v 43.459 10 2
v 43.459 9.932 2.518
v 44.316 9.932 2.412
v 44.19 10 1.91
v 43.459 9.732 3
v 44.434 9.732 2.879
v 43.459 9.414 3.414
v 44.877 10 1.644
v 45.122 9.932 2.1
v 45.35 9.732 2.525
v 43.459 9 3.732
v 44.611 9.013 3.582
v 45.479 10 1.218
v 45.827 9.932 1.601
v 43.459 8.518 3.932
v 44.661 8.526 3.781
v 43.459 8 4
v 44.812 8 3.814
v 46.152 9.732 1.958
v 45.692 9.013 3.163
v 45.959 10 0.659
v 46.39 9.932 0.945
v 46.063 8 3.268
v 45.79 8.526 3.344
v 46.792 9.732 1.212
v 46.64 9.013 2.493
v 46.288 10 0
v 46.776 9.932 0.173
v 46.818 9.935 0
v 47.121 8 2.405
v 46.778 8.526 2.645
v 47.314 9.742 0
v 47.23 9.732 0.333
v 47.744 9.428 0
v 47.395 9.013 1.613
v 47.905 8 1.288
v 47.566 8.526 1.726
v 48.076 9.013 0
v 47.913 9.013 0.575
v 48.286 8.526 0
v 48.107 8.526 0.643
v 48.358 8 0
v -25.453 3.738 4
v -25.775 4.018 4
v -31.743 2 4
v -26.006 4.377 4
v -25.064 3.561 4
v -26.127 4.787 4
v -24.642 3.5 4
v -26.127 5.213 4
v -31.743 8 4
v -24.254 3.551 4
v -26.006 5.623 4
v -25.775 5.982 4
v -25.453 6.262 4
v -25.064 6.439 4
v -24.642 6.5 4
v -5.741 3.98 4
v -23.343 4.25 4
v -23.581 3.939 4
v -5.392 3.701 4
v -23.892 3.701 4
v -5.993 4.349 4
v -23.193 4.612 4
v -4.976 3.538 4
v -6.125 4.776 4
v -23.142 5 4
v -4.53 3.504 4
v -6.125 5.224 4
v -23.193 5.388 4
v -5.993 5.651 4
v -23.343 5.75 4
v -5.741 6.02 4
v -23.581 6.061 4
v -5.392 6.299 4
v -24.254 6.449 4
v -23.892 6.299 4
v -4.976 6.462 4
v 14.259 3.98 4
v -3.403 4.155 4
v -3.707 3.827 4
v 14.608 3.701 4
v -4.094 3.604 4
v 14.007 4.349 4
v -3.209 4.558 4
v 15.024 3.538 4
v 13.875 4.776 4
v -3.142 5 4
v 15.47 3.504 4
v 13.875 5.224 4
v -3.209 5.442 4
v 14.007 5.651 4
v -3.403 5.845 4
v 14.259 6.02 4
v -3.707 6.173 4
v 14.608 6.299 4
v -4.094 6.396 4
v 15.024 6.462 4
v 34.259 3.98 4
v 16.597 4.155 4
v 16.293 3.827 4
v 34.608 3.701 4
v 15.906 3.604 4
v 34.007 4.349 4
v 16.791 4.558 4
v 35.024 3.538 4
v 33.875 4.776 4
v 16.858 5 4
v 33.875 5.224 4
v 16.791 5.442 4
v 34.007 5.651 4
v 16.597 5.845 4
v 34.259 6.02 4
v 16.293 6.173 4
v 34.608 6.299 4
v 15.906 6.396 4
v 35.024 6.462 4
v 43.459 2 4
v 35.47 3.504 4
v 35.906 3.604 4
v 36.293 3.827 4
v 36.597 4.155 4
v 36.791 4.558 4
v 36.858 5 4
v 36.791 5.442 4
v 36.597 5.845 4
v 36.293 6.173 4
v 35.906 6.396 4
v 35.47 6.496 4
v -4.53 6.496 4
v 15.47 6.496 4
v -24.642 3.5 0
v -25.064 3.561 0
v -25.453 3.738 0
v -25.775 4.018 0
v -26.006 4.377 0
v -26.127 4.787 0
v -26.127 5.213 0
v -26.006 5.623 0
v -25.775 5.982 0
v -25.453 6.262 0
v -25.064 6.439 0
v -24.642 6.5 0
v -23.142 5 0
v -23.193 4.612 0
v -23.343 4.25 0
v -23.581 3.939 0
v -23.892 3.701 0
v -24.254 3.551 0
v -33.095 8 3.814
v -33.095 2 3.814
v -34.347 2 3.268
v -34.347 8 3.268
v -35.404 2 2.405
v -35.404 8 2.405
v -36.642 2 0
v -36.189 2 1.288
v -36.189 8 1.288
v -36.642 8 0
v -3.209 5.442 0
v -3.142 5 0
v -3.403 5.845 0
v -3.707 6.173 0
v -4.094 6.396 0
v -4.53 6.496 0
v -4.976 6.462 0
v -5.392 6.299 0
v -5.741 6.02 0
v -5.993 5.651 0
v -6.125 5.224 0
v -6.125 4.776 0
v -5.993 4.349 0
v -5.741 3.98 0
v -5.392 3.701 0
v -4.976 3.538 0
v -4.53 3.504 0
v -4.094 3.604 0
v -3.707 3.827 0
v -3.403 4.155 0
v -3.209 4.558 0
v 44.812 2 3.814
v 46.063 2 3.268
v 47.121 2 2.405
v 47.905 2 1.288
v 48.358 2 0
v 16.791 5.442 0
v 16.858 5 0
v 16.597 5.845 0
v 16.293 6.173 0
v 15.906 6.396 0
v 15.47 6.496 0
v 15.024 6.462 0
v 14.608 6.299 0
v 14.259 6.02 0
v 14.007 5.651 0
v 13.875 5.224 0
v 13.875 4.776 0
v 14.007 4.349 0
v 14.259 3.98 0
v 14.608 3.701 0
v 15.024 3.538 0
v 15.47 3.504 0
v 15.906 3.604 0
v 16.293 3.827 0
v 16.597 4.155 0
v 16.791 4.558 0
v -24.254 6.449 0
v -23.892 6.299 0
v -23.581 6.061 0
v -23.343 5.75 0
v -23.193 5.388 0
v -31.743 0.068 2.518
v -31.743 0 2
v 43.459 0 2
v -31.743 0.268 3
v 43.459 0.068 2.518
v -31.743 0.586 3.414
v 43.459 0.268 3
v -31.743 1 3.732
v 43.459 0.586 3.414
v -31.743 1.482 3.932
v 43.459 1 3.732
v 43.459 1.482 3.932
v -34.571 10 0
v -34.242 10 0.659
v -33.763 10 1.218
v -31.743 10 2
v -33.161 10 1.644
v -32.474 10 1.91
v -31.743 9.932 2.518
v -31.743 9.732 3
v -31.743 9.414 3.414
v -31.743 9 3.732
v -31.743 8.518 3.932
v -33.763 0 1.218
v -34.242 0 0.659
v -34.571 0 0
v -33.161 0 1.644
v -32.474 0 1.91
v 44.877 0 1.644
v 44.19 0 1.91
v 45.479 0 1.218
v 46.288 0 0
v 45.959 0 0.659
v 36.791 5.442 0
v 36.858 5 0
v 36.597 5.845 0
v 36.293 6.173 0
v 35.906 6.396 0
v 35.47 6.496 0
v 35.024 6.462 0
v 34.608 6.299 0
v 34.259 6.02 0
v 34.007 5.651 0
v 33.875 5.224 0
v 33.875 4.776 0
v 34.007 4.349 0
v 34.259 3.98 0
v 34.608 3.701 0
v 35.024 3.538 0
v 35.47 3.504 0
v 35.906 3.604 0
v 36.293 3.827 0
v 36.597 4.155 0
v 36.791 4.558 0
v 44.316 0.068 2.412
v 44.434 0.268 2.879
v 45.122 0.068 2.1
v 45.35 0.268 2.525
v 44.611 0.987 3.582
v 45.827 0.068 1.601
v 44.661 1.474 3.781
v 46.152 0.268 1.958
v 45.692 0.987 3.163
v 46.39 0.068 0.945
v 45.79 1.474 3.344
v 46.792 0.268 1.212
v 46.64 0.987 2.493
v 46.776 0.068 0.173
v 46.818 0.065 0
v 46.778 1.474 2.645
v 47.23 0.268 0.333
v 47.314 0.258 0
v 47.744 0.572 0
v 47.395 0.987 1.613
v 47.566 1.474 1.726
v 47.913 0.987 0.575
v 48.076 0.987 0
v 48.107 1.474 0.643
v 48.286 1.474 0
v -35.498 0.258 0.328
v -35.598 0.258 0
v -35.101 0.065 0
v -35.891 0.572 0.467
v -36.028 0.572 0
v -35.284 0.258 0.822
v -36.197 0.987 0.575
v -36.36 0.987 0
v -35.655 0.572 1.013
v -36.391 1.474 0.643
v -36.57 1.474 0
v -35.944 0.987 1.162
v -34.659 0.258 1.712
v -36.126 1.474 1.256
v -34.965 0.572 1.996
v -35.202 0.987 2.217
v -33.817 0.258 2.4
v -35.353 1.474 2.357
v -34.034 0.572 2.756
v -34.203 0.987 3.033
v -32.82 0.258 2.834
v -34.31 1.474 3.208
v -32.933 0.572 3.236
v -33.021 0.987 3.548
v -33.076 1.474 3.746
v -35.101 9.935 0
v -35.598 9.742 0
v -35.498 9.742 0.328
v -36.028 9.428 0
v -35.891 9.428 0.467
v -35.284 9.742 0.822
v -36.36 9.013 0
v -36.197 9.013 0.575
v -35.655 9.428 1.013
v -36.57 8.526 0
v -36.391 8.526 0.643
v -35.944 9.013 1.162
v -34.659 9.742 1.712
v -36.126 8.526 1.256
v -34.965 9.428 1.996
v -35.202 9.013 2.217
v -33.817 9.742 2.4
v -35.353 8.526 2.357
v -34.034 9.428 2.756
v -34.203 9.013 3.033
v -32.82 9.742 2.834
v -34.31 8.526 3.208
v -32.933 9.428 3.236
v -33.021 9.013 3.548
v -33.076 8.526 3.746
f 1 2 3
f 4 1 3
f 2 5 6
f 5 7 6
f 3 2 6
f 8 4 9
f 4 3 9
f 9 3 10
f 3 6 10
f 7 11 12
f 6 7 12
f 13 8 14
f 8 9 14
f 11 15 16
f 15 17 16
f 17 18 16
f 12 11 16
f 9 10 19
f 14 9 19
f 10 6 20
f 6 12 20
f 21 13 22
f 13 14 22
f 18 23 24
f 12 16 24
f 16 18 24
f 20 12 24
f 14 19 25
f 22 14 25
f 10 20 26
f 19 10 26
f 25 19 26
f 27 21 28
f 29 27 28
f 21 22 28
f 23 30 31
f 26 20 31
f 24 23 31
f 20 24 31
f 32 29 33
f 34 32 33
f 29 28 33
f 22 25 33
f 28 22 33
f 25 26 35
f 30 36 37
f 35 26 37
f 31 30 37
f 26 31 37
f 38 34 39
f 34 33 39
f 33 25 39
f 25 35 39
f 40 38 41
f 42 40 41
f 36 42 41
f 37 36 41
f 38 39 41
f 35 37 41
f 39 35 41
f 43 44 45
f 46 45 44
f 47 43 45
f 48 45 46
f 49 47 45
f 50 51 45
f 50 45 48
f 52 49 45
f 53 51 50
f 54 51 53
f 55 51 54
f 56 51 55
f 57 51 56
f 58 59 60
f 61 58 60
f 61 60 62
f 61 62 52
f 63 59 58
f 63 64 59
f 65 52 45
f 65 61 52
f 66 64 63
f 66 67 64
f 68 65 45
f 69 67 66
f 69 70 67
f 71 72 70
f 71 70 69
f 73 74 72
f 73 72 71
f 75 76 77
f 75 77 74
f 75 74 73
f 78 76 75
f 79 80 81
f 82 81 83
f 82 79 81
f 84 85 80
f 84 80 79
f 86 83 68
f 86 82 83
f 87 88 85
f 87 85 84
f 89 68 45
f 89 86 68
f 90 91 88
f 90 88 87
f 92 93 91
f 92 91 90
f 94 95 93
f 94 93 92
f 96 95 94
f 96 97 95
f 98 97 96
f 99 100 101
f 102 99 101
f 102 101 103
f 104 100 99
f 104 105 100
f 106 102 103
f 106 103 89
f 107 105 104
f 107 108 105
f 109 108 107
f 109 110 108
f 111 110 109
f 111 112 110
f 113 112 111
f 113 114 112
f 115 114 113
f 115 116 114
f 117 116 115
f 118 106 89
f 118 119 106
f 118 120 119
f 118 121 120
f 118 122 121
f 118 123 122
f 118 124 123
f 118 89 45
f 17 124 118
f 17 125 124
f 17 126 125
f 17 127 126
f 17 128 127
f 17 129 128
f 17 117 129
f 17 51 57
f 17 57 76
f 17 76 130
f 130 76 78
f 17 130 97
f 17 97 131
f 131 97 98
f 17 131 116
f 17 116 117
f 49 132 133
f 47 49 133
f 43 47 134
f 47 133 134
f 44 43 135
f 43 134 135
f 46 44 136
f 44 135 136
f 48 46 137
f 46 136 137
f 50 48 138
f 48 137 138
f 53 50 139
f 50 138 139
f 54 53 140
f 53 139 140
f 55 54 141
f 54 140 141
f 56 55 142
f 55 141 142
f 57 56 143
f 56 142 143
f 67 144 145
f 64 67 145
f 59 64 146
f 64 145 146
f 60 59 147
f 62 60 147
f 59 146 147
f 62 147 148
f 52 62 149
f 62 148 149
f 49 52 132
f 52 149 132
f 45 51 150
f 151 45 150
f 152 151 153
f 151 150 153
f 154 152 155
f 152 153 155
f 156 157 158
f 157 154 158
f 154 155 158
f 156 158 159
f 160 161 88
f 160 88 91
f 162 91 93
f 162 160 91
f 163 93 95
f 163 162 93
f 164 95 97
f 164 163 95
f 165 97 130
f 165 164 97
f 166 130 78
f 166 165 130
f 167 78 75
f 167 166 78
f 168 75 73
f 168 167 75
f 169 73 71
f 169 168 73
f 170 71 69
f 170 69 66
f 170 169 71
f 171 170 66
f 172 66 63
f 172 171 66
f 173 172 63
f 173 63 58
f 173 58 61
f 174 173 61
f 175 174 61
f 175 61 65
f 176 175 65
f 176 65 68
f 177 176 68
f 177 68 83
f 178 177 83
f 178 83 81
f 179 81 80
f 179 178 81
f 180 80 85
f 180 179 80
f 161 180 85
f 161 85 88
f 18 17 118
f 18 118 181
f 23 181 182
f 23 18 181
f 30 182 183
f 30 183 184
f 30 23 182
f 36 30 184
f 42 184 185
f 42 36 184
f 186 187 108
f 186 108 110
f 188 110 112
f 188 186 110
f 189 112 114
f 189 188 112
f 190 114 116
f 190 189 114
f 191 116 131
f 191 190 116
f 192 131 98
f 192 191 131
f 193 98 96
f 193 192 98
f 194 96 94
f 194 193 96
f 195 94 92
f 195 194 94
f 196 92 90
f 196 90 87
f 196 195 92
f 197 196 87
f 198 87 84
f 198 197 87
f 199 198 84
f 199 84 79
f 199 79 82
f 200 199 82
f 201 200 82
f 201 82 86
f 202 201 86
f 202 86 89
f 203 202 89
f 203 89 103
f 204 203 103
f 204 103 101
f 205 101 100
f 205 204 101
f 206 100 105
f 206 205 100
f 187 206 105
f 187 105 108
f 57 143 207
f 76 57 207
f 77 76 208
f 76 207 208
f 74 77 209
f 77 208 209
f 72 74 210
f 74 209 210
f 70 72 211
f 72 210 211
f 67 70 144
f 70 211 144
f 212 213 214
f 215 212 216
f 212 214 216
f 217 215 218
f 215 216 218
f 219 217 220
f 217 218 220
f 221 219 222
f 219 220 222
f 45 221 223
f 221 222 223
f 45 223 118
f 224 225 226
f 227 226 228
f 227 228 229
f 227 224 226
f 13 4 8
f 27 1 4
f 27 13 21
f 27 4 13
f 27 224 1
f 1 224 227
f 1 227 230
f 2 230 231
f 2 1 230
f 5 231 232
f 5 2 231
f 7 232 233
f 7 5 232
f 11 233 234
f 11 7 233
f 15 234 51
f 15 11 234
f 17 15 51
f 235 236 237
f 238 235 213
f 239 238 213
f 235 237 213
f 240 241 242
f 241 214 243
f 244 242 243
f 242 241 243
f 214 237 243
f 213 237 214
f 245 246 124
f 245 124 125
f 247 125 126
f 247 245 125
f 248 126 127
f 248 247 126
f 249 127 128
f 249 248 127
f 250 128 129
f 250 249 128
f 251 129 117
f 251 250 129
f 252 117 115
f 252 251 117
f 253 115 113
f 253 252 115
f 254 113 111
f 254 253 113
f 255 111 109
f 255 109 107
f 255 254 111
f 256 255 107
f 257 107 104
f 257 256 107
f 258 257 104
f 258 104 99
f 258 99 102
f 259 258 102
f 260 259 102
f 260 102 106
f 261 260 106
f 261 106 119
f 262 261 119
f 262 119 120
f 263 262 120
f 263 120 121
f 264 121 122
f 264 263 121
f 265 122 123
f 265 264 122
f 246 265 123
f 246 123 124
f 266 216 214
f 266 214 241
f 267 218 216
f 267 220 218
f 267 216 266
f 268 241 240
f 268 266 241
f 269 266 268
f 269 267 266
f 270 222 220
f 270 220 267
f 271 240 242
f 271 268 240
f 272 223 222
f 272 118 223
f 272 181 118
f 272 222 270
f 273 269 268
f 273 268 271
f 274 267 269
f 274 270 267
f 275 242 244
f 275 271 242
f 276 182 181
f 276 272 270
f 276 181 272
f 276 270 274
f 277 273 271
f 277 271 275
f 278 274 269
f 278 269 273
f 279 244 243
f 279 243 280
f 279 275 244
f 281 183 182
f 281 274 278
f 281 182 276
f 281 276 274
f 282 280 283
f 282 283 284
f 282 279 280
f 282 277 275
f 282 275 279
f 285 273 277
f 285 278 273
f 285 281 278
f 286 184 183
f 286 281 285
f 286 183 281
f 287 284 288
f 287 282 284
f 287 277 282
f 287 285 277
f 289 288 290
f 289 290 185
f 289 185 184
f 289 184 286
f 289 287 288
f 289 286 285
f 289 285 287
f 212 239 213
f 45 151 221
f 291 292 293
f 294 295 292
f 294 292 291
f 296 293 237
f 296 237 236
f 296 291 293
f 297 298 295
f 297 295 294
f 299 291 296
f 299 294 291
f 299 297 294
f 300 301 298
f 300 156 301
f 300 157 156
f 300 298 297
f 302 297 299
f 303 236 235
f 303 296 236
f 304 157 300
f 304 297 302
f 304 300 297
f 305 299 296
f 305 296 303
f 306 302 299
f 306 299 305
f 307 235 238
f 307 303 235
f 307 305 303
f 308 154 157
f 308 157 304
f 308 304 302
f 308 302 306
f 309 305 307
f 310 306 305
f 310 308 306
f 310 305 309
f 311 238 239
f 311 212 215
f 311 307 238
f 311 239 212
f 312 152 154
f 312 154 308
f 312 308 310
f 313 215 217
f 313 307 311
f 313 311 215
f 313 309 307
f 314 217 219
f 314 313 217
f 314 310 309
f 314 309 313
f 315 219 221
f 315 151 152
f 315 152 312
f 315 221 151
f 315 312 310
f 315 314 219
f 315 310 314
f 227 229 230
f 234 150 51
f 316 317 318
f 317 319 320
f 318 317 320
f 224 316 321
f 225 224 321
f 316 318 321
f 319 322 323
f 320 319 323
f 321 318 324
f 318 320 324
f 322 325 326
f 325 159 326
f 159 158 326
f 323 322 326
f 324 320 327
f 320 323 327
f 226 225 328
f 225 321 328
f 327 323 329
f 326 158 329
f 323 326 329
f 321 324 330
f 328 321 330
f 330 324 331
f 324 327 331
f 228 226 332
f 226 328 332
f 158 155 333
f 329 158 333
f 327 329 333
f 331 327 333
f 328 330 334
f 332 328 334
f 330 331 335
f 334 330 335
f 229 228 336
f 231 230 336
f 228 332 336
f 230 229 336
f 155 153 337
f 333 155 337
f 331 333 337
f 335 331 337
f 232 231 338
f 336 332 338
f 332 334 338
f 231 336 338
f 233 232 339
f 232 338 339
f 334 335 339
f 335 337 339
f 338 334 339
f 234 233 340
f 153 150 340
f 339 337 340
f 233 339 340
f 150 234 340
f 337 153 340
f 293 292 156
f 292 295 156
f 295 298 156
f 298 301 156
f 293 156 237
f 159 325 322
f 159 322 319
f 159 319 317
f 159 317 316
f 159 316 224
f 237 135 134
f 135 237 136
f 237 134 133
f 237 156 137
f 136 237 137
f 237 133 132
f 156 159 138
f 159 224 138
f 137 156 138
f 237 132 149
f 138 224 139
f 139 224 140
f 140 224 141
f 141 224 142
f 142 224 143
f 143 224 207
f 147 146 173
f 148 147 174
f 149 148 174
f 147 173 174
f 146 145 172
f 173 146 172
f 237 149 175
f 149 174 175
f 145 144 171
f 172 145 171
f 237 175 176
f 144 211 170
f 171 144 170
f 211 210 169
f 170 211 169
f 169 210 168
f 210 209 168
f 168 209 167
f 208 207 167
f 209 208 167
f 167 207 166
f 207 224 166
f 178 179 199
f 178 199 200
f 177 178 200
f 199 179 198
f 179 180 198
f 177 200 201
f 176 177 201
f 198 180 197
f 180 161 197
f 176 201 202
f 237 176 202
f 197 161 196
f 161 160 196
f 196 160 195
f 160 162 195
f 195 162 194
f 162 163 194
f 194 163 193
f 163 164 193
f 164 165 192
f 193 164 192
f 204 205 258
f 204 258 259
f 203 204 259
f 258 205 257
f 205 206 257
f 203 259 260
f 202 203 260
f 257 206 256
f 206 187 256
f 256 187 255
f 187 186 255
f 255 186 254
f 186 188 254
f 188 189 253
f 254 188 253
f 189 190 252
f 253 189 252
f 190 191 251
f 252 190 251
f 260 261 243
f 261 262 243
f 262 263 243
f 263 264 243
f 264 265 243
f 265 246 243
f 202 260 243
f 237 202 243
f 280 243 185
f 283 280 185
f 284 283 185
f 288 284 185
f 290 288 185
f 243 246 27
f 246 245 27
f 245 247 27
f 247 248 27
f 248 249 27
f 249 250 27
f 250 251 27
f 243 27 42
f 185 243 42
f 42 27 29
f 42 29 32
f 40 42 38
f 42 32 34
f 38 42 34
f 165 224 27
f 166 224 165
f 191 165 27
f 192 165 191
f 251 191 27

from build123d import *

# Parameters (mm, degrees)
F0_W        = 85
F0_H        = 10
F0_R        = 1.5
F1_DEPTH    = 4
F2_T1_DEPTH = 34.4948974279
F3_R        = 2


# Not quite as in the source:
# - a fillet or chamfer that OpenCascade refuses, or shapes differently, is made with other operations: its cross-section is extruded or revolved along the edge and cut away or added


with BuildPart() as f1:
    # F0 (on Top) → F1 (new body)
    with BuildSketch(Plane.XY):
        with Locations((5.8581340313, 5)):
            Rectangle(F0_W, F0_H)
        with BuildLine():
            ThreePointArc((-24.6418659687, 6.5), (-23.5812057969, 6.0606601718), (-23.1418659687, 5))
            ThreePointArc((-23.1418659687, 5), (-23.5812057969, 3.9393398282), (-24.6418659687, 3.5))
            ThreePointArc((-24.6418659687, 3.5), (-26.1418659687, 5), (-24.6418659687, 6.5))
        make_face(mode=Mode.SUBTRACT)
        with Locations((-4.6418659687, 5)):
            Circle(F0_R, mode=Mode.SUBTRACT)
        with Locations((15.3581340313, 5)):
            Circle(F0_R, mode=Mode.SUBTRACT)
        with Locations((35.3581340313, 5)):
            Circle(F0_R, mode=Mode.SUBTRACT)
    extrude(amount=F1_DEPTH)

    # F2: fillet of radius 5 on 2 edges, made by hand

    # F2_s2 → F2_t1 (cut)
    with BuildSketch(Plane.XZ.offset(-22.2474487139)):
        with BuildLine():
            ThreePointArc((-31.7428864831, 4), (-34.9051641433, 2.8729833462), (-36.6418659687, 0))
            Line((-36.6418659687, 0), (-36.6418659687, 4))
            Line((-36.6418659687, 4), (-31.7428864831, 4))
        make_face()
        with BuildLine():
            ThreePointArc((43.4591545457, 4), (46.6214322059, 2.8729833462), (48.3581340313, 0))
            Line((48.3581340313, 0), (48.3581340313, 4))
            Line((48.3581340313, 4), (43.4591545457, 4))
        make_face()
    extrude(amount=F2_T1_DEPTH, mode=Mode.SUBTRACT)

    # F3
    f3_edges = [f1.edges().sort_by_distance(p)[0] for p in [
        (5.858134, 10, 4),
        (5.858134, 0, 4),
        (-34.905164, 10, 2.872983),
        (46.621432, 10, 2.872983),
        (-34.905164, 0, 2.872983),
        (46.621432, 0, 2.872983),
    ]]
    fillet(f3_edges, radius=F3_R)


solid = f1.part
